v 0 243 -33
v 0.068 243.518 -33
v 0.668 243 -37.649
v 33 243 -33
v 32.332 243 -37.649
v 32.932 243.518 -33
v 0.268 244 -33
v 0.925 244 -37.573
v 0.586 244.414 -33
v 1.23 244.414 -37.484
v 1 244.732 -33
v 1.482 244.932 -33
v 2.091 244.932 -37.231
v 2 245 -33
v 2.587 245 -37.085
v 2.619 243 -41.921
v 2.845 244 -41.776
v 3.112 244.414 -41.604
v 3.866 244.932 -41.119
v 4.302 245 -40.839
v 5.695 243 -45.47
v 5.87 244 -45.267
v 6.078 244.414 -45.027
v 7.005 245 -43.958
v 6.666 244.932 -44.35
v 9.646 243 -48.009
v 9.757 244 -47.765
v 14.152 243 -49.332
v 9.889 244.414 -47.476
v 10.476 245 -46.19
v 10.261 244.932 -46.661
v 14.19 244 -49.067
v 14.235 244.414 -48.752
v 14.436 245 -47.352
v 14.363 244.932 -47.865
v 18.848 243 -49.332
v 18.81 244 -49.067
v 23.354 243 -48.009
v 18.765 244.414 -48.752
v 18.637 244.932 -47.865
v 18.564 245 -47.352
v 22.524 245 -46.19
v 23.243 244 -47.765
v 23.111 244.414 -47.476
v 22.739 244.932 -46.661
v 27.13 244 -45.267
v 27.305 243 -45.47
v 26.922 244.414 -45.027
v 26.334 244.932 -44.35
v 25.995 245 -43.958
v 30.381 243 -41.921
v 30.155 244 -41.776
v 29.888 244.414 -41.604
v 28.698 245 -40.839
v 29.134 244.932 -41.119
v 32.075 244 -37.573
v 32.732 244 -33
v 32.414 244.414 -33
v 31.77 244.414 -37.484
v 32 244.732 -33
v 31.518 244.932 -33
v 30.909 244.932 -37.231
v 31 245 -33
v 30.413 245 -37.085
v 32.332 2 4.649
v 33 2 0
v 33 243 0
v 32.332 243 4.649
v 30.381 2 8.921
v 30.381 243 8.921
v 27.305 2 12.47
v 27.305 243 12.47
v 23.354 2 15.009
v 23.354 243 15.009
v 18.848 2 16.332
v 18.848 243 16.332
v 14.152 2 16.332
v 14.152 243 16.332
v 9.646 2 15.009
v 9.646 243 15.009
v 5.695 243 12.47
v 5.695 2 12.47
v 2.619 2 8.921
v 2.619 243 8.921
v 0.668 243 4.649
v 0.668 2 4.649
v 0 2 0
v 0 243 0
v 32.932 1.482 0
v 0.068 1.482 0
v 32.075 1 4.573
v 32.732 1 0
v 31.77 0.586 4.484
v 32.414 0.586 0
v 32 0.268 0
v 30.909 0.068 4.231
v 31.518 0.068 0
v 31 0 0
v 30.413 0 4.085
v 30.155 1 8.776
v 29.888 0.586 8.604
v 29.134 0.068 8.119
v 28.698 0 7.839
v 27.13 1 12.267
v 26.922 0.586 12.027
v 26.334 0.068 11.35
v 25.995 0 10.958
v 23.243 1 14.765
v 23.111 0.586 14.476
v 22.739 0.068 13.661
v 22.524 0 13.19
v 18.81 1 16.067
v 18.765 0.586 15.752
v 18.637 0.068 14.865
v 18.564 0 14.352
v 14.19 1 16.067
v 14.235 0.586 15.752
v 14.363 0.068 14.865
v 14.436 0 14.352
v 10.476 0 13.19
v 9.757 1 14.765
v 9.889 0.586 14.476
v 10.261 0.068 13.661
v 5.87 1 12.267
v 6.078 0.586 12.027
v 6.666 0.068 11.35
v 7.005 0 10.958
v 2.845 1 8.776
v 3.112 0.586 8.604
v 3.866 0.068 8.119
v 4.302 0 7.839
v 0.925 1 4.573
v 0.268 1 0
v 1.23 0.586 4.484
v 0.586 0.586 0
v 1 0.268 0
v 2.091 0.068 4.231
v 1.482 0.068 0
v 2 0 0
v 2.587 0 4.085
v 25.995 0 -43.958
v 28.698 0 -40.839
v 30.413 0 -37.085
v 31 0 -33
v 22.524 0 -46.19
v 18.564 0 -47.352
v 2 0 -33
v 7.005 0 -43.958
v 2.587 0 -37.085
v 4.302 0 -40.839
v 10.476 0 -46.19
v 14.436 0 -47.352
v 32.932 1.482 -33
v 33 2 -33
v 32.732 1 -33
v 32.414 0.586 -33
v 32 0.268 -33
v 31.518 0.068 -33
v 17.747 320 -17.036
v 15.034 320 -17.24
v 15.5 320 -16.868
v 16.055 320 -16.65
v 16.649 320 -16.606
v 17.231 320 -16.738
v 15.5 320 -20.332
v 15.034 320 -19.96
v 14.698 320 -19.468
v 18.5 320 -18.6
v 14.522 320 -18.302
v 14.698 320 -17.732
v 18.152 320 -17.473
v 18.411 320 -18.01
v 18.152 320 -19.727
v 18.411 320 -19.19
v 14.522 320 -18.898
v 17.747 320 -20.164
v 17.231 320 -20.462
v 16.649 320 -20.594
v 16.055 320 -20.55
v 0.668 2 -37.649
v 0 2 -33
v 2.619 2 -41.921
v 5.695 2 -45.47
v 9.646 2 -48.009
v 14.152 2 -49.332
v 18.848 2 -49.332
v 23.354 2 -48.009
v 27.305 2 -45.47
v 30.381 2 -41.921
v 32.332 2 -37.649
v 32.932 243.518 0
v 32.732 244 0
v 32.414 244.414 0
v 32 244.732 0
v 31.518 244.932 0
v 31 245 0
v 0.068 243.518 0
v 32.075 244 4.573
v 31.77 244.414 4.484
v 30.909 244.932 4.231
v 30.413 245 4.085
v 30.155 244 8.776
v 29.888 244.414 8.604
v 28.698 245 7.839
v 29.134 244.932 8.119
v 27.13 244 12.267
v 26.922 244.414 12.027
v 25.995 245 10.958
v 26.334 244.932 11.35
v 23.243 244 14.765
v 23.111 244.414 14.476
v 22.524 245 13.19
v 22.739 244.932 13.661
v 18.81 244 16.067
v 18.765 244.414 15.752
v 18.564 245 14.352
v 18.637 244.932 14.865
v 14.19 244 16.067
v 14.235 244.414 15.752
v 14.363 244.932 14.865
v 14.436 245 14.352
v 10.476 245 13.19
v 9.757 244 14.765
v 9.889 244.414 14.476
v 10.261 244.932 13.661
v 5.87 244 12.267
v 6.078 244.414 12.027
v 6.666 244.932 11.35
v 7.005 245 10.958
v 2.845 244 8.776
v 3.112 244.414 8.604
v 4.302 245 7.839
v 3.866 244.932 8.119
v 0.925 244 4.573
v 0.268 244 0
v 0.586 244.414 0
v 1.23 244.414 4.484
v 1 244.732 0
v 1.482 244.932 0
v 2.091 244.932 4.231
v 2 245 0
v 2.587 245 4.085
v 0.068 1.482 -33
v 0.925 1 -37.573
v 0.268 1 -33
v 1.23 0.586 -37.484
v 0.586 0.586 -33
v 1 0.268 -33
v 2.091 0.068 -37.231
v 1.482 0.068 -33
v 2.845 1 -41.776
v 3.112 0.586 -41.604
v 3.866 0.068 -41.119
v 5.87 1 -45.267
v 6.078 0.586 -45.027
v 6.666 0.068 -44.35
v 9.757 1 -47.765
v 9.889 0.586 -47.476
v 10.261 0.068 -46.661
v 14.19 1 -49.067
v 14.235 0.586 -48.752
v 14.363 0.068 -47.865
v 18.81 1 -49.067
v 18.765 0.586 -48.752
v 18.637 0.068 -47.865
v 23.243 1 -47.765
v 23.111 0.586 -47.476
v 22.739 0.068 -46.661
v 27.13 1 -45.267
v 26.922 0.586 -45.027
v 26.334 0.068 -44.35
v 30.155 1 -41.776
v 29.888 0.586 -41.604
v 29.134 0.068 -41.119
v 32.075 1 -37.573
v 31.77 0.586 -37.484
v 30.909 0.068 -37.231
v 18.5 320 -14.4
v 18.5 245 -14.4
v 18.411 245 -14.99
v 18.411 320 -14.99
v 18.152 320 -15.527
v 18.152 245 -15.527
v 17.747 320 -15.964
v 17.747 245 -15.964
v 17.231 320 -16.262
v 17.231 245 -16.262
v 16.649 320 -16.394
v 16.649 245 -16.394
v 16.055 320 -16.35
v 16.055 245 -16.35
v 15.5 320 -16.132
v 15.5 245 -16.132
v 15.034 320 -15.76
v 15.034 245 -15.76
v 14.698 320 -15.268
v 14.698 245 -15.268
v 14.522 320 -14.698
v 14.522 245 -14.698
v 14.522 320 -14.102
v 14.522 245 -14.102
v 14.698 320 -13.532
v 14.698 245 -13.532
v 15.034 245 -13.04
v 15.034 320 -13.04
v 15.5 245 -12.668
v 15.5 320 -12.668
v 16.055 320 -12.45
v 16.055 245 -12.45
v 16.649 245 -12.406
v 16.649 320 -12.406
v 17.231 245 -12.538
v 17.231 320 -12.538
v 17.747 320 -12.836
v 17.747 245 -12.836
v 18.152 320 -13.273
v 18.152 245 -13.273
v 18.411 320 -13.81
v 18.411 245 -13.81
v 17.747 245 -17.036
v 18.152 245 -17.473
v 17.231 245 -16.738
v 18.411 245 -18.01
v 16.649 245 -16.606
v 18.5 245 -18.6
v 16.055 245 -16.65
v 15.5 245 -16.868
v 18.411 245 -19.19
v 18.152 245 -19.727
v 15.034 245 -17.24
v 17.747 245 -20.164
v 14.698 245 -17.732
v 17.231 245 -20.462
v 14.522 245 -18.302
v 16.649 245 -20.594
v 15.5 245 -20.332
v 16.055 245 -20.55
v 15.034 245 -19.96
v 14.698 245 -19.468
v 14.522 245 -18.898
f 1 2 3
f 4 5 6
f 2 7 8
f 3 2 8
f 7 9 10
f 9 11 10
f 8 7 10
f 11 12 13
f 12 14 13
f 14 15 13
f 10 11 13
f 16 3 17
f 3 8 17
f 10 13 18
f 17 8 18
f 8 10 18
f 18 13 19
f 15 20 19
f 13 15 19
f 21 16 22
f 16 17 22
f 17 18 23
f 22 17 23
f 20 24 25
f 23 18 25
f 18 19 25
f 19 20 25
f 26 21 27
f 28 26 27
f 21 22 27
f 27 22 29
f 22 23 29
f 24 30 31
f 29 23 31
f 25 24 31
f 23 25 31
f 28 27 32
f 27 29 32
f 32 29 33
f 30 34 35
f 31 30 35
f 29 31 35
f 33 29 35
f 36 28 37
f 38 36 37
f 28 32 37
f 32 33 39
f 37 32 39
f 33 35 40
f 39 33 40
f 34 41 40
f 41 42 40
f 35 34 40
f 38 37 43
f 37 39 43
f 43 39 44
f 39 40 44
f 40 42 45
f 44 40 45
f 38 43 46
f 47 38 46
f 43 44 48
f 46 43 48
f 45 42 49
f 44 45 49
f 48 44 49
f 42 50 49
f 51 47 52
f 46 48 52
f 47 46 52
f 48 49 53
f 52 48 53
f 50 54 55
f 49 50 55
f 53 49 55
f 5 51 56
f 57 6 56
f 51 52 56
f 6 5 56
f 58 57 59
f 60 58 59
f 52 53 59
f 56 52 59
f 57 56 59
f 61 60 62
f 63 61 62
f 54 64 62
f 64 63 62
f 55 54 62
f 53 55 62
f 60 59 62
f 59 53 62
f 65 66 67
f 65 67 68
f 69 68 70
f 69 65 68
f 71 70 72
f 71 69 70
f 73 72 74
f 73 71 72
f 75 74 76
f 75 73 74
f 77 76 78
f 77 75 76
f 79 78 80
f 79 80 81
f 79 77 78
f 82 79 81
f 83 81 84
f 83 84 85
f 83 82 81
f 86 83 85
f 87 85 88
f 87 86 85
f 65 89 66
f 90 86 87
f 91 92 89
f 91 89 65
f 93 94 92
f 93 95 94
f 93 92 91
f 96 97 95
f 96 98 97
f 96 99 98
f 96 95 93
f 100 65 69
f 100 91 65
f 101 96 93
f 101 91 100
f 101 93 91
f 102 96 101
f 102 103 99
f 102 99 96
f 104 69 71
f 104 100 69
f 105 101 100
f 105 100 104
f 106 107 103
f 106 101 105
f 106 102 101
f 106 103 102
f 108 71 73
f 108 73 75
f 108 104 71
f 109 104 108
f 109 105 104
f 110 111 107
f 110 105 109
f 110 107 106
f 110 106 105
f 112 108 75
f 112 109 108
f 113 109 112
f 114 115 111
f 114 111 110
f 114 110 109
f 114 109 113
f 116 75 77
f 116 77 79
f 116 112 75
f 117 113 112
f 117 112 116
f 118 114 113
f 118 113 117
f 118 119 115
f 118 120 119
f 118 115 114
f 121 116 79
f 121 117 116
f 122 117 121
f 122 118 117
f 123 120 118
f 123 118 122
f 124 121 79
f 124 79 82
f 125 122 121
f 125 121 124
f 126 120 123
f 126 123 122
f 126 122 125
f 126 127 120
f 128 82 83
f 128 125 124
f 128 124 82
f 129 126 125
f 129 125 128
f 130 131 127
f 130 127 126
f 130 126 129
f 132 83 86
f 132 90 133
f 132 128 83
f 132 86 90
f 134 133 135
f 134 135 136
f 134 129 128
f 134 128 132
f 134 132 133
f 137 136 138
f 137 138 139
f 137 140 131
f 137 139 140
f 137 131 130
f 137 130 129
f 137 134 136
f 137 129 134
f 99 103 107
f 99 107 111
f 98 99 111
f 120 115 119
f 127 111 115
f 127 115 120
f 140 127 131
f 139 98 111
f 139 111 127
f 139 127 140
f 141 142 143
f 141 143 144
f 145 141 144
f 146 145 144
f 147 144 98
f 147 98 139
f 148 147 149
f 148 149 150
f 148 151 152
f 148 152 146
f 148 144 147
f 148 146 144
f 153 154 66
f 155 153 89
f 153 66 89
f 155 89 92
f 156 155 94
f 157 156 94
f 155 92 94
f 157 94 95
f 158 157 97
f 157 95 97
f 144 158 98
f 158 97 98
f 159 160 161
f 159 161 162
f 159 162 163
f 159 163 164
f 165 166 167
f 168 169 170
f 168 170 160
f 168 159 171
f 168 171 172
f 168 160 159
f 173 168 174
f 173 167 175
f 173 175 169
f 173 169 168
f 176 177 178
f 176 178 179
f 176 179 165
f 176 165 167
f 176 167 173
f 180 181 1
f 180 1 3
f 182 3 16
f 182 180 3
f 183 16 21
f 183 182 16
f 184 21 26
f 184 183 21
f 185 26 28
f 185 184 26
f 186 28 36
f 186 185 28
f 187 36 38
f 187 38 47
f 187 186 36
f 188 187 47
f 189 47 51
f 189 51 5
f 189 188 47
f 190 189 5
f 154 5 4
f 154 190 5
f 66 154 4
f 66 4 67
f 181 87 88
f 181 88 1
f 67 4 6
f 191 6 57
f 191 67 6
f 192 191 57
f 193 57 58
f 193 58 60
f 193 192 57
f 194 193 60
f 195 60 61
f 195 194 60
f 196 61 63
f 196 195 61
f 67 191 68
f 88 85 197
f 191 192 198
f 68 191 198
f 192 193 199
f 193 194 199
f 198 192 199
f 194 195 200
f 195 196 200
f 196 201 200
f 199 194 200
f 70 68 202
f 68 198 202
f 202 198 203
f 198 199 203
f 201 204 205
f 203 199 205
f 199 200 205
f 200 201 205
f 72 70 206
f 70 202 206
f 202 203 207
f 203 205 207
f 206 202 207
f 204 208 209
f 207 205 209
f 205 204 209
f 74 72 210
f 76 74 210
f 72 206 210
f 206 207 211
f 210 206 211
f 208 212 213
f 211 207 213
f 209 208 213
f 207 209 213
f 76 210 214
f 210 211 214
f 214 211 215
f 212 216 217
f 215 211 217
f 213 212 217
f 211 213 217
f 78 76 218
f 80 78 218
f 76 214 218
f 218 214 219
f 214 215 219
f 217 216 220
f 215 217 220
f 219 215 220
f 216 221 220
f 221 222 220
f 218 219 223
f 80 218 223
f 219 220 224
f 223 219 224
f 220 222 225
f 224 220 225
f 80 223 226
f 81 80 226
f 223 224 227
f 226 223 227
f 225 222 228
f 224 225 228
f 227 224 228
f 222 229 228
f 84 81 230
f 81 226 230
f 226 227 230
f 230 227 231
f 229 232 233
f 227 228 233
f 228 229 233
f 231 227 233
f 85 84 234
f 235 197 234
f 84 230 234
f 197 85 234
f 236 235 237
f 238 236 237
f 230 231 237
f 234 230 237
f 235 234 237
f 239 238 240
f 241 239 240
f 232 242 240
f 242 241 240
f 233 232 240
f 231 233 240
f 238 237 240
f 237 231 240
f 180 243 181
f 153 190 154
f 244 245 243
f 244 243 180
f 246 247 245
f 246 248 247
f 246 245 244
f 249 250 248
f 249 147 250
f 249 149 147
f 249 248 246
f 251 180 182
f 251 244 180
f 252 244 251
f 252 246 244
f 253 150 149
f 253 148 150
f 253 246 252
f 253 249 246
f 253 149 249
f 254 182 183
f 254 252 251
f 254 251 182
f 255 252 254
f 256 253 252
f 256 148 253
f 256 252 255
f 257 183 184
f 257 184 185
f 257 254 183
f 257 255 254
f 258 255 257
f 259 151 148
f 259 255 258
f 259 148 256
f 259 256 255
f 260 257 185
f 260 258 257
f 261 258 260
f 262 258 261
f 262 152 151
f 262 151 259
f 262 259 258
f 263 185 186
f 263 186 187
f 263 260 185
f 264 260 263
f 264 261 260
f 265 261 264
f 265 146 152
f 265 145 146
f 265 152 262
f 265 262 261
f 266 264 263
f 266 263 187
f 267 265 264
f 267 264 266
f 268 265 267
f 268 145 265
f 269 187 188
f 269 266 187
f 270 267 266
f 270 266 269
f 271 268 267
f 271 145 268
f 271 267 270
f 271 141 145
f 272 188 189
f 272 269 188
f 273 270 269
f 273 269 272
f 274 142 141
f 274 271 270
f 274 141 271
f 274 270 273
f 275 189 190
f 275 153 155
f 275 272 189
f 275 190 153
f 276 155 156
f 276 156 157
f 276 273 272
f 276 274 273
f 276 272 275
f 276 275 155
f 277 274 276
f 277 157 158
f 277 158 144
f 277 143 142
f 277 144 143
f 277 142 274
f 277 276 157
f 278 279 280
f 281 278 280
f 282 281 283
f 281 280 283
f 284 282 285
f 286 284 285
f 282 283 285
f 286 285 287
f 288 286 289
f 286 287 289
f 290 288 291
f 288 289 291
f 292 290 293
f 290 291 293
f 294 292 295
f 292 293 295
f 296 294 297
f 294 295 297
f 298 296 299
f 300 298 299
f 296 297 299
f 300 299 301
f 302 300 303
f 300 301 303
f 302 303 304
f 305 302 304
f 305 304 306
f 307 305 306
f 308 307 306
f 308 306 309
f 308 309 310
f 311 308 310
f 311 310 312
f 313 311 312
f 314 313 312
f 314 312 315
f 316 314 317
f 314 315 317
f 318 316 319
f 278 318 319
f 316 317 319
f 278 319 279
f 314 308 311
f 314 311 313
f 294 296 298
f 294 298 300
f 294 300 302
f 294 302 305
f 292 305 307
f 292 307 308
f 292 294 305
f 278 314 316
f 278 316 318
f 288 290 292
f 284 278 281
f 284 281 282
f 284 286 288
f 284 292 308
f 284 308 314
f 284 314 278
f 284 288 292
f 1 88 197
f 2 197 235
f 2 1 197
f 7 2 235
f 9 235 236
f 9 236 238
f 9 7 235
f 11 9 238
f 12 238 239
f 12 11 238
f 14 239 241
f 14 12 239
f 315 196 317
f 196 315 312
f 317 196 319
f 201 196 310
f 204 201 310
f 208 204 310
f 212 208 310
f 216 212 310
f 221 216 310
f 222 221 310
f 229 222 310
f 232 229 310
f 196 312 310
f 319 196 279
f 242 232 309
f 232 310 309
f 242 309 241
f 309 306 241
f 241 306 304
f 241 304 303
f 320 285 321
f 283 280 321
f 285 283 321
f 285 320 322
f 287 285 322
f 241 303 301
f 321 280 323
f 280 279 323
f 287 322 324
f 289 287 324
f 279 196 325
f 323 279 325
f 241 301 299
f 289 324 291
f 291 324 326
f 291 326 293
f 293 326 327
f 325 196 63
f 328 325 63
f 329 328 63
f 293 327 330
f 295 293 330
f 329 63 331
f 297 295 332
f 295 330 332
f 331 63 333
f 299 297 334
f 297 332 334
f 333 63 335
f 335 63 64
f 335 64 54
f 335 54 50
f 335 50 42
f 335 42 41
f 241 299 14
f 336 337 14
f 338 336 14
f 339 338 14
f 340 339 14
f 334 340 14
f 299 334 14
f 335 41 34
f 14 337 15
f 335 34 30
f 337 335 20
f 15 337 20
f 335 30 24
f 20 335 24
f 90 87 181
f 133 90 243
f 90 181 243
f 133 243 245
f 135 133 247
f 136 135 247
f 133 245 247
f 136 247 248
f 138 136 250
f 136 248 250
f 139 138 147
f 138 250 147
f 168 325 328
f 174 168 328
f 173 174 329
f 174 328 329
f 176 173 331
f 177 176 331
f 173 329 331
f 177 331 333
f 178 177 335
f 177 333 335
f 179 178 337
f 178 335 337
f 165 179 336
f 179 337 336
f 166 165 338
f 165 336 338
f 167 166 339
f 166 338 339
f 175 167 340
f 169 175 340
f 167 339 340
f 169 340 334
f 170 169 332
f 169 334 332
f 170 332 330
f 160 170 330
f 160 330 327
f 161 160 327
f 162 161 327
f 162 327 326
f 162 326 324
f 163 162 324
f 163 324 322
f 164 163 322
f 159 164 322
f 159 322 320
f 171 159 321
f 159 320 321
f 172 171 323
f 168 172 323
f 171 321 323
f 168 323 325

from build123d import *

# Parameters (mm, degrees)
EXTRUSION1_DEPTH = 245
CONG_1_R         = 2
ESQUISSE2_R      = 2
EXTRUSION2_DEPTH = 75


with BuildPart() as part:
    # Esquisse1 → Extrusion1 (new body)
    with BuildSketch(Plane(origin=(0, 0, 0), x_dir=(1, 0, 0), z_dir=(0, 1, 0))):
        with BuildLine():
            Line((0, 0), (0, 33))
            ThreePointArc((0, 33), (16.5, 49.5), (33, 33))
            Line((33, 33), (33, 0))
            ThreePointArc((33, 0), (16.5, -16.5), (0, 0))
        make_face()
    extrude(amount=EXTRUSION1_DEPTH)

    # Congé1
    cong_1_edges = [part.edges().sort_by_distance(p)[0] for p in [
        (16.5, 245, -49.5),
        (0, 245, -16.5),
        (16.5, 245, 16.5),
        (0, 0, -16.5),
        (16.5, 0, -49.5),
        (33, 0, -16.5),
        (16.5, 0, 16.5),
        (33, 245, -16.5),
    ]]
    fillet(cong_1_edges, radius=CONG_1_R)

    # Esquisse2 → Extrusion2 (add)
    with BuildSketch(Plane(origin=(0, 245, 0), x_dir=(1, 0, 0), z_dir=(0, 1, 0))):
        with Locations((16.5, 18.6)):
            Circle(ESQUISSE2_R)
        with Locations((16.5, 14.4)):
            Circle(ESQUISSE2_R)
    extrude(amount=EXTRUSION2_DEPTH)


solid = part.part
